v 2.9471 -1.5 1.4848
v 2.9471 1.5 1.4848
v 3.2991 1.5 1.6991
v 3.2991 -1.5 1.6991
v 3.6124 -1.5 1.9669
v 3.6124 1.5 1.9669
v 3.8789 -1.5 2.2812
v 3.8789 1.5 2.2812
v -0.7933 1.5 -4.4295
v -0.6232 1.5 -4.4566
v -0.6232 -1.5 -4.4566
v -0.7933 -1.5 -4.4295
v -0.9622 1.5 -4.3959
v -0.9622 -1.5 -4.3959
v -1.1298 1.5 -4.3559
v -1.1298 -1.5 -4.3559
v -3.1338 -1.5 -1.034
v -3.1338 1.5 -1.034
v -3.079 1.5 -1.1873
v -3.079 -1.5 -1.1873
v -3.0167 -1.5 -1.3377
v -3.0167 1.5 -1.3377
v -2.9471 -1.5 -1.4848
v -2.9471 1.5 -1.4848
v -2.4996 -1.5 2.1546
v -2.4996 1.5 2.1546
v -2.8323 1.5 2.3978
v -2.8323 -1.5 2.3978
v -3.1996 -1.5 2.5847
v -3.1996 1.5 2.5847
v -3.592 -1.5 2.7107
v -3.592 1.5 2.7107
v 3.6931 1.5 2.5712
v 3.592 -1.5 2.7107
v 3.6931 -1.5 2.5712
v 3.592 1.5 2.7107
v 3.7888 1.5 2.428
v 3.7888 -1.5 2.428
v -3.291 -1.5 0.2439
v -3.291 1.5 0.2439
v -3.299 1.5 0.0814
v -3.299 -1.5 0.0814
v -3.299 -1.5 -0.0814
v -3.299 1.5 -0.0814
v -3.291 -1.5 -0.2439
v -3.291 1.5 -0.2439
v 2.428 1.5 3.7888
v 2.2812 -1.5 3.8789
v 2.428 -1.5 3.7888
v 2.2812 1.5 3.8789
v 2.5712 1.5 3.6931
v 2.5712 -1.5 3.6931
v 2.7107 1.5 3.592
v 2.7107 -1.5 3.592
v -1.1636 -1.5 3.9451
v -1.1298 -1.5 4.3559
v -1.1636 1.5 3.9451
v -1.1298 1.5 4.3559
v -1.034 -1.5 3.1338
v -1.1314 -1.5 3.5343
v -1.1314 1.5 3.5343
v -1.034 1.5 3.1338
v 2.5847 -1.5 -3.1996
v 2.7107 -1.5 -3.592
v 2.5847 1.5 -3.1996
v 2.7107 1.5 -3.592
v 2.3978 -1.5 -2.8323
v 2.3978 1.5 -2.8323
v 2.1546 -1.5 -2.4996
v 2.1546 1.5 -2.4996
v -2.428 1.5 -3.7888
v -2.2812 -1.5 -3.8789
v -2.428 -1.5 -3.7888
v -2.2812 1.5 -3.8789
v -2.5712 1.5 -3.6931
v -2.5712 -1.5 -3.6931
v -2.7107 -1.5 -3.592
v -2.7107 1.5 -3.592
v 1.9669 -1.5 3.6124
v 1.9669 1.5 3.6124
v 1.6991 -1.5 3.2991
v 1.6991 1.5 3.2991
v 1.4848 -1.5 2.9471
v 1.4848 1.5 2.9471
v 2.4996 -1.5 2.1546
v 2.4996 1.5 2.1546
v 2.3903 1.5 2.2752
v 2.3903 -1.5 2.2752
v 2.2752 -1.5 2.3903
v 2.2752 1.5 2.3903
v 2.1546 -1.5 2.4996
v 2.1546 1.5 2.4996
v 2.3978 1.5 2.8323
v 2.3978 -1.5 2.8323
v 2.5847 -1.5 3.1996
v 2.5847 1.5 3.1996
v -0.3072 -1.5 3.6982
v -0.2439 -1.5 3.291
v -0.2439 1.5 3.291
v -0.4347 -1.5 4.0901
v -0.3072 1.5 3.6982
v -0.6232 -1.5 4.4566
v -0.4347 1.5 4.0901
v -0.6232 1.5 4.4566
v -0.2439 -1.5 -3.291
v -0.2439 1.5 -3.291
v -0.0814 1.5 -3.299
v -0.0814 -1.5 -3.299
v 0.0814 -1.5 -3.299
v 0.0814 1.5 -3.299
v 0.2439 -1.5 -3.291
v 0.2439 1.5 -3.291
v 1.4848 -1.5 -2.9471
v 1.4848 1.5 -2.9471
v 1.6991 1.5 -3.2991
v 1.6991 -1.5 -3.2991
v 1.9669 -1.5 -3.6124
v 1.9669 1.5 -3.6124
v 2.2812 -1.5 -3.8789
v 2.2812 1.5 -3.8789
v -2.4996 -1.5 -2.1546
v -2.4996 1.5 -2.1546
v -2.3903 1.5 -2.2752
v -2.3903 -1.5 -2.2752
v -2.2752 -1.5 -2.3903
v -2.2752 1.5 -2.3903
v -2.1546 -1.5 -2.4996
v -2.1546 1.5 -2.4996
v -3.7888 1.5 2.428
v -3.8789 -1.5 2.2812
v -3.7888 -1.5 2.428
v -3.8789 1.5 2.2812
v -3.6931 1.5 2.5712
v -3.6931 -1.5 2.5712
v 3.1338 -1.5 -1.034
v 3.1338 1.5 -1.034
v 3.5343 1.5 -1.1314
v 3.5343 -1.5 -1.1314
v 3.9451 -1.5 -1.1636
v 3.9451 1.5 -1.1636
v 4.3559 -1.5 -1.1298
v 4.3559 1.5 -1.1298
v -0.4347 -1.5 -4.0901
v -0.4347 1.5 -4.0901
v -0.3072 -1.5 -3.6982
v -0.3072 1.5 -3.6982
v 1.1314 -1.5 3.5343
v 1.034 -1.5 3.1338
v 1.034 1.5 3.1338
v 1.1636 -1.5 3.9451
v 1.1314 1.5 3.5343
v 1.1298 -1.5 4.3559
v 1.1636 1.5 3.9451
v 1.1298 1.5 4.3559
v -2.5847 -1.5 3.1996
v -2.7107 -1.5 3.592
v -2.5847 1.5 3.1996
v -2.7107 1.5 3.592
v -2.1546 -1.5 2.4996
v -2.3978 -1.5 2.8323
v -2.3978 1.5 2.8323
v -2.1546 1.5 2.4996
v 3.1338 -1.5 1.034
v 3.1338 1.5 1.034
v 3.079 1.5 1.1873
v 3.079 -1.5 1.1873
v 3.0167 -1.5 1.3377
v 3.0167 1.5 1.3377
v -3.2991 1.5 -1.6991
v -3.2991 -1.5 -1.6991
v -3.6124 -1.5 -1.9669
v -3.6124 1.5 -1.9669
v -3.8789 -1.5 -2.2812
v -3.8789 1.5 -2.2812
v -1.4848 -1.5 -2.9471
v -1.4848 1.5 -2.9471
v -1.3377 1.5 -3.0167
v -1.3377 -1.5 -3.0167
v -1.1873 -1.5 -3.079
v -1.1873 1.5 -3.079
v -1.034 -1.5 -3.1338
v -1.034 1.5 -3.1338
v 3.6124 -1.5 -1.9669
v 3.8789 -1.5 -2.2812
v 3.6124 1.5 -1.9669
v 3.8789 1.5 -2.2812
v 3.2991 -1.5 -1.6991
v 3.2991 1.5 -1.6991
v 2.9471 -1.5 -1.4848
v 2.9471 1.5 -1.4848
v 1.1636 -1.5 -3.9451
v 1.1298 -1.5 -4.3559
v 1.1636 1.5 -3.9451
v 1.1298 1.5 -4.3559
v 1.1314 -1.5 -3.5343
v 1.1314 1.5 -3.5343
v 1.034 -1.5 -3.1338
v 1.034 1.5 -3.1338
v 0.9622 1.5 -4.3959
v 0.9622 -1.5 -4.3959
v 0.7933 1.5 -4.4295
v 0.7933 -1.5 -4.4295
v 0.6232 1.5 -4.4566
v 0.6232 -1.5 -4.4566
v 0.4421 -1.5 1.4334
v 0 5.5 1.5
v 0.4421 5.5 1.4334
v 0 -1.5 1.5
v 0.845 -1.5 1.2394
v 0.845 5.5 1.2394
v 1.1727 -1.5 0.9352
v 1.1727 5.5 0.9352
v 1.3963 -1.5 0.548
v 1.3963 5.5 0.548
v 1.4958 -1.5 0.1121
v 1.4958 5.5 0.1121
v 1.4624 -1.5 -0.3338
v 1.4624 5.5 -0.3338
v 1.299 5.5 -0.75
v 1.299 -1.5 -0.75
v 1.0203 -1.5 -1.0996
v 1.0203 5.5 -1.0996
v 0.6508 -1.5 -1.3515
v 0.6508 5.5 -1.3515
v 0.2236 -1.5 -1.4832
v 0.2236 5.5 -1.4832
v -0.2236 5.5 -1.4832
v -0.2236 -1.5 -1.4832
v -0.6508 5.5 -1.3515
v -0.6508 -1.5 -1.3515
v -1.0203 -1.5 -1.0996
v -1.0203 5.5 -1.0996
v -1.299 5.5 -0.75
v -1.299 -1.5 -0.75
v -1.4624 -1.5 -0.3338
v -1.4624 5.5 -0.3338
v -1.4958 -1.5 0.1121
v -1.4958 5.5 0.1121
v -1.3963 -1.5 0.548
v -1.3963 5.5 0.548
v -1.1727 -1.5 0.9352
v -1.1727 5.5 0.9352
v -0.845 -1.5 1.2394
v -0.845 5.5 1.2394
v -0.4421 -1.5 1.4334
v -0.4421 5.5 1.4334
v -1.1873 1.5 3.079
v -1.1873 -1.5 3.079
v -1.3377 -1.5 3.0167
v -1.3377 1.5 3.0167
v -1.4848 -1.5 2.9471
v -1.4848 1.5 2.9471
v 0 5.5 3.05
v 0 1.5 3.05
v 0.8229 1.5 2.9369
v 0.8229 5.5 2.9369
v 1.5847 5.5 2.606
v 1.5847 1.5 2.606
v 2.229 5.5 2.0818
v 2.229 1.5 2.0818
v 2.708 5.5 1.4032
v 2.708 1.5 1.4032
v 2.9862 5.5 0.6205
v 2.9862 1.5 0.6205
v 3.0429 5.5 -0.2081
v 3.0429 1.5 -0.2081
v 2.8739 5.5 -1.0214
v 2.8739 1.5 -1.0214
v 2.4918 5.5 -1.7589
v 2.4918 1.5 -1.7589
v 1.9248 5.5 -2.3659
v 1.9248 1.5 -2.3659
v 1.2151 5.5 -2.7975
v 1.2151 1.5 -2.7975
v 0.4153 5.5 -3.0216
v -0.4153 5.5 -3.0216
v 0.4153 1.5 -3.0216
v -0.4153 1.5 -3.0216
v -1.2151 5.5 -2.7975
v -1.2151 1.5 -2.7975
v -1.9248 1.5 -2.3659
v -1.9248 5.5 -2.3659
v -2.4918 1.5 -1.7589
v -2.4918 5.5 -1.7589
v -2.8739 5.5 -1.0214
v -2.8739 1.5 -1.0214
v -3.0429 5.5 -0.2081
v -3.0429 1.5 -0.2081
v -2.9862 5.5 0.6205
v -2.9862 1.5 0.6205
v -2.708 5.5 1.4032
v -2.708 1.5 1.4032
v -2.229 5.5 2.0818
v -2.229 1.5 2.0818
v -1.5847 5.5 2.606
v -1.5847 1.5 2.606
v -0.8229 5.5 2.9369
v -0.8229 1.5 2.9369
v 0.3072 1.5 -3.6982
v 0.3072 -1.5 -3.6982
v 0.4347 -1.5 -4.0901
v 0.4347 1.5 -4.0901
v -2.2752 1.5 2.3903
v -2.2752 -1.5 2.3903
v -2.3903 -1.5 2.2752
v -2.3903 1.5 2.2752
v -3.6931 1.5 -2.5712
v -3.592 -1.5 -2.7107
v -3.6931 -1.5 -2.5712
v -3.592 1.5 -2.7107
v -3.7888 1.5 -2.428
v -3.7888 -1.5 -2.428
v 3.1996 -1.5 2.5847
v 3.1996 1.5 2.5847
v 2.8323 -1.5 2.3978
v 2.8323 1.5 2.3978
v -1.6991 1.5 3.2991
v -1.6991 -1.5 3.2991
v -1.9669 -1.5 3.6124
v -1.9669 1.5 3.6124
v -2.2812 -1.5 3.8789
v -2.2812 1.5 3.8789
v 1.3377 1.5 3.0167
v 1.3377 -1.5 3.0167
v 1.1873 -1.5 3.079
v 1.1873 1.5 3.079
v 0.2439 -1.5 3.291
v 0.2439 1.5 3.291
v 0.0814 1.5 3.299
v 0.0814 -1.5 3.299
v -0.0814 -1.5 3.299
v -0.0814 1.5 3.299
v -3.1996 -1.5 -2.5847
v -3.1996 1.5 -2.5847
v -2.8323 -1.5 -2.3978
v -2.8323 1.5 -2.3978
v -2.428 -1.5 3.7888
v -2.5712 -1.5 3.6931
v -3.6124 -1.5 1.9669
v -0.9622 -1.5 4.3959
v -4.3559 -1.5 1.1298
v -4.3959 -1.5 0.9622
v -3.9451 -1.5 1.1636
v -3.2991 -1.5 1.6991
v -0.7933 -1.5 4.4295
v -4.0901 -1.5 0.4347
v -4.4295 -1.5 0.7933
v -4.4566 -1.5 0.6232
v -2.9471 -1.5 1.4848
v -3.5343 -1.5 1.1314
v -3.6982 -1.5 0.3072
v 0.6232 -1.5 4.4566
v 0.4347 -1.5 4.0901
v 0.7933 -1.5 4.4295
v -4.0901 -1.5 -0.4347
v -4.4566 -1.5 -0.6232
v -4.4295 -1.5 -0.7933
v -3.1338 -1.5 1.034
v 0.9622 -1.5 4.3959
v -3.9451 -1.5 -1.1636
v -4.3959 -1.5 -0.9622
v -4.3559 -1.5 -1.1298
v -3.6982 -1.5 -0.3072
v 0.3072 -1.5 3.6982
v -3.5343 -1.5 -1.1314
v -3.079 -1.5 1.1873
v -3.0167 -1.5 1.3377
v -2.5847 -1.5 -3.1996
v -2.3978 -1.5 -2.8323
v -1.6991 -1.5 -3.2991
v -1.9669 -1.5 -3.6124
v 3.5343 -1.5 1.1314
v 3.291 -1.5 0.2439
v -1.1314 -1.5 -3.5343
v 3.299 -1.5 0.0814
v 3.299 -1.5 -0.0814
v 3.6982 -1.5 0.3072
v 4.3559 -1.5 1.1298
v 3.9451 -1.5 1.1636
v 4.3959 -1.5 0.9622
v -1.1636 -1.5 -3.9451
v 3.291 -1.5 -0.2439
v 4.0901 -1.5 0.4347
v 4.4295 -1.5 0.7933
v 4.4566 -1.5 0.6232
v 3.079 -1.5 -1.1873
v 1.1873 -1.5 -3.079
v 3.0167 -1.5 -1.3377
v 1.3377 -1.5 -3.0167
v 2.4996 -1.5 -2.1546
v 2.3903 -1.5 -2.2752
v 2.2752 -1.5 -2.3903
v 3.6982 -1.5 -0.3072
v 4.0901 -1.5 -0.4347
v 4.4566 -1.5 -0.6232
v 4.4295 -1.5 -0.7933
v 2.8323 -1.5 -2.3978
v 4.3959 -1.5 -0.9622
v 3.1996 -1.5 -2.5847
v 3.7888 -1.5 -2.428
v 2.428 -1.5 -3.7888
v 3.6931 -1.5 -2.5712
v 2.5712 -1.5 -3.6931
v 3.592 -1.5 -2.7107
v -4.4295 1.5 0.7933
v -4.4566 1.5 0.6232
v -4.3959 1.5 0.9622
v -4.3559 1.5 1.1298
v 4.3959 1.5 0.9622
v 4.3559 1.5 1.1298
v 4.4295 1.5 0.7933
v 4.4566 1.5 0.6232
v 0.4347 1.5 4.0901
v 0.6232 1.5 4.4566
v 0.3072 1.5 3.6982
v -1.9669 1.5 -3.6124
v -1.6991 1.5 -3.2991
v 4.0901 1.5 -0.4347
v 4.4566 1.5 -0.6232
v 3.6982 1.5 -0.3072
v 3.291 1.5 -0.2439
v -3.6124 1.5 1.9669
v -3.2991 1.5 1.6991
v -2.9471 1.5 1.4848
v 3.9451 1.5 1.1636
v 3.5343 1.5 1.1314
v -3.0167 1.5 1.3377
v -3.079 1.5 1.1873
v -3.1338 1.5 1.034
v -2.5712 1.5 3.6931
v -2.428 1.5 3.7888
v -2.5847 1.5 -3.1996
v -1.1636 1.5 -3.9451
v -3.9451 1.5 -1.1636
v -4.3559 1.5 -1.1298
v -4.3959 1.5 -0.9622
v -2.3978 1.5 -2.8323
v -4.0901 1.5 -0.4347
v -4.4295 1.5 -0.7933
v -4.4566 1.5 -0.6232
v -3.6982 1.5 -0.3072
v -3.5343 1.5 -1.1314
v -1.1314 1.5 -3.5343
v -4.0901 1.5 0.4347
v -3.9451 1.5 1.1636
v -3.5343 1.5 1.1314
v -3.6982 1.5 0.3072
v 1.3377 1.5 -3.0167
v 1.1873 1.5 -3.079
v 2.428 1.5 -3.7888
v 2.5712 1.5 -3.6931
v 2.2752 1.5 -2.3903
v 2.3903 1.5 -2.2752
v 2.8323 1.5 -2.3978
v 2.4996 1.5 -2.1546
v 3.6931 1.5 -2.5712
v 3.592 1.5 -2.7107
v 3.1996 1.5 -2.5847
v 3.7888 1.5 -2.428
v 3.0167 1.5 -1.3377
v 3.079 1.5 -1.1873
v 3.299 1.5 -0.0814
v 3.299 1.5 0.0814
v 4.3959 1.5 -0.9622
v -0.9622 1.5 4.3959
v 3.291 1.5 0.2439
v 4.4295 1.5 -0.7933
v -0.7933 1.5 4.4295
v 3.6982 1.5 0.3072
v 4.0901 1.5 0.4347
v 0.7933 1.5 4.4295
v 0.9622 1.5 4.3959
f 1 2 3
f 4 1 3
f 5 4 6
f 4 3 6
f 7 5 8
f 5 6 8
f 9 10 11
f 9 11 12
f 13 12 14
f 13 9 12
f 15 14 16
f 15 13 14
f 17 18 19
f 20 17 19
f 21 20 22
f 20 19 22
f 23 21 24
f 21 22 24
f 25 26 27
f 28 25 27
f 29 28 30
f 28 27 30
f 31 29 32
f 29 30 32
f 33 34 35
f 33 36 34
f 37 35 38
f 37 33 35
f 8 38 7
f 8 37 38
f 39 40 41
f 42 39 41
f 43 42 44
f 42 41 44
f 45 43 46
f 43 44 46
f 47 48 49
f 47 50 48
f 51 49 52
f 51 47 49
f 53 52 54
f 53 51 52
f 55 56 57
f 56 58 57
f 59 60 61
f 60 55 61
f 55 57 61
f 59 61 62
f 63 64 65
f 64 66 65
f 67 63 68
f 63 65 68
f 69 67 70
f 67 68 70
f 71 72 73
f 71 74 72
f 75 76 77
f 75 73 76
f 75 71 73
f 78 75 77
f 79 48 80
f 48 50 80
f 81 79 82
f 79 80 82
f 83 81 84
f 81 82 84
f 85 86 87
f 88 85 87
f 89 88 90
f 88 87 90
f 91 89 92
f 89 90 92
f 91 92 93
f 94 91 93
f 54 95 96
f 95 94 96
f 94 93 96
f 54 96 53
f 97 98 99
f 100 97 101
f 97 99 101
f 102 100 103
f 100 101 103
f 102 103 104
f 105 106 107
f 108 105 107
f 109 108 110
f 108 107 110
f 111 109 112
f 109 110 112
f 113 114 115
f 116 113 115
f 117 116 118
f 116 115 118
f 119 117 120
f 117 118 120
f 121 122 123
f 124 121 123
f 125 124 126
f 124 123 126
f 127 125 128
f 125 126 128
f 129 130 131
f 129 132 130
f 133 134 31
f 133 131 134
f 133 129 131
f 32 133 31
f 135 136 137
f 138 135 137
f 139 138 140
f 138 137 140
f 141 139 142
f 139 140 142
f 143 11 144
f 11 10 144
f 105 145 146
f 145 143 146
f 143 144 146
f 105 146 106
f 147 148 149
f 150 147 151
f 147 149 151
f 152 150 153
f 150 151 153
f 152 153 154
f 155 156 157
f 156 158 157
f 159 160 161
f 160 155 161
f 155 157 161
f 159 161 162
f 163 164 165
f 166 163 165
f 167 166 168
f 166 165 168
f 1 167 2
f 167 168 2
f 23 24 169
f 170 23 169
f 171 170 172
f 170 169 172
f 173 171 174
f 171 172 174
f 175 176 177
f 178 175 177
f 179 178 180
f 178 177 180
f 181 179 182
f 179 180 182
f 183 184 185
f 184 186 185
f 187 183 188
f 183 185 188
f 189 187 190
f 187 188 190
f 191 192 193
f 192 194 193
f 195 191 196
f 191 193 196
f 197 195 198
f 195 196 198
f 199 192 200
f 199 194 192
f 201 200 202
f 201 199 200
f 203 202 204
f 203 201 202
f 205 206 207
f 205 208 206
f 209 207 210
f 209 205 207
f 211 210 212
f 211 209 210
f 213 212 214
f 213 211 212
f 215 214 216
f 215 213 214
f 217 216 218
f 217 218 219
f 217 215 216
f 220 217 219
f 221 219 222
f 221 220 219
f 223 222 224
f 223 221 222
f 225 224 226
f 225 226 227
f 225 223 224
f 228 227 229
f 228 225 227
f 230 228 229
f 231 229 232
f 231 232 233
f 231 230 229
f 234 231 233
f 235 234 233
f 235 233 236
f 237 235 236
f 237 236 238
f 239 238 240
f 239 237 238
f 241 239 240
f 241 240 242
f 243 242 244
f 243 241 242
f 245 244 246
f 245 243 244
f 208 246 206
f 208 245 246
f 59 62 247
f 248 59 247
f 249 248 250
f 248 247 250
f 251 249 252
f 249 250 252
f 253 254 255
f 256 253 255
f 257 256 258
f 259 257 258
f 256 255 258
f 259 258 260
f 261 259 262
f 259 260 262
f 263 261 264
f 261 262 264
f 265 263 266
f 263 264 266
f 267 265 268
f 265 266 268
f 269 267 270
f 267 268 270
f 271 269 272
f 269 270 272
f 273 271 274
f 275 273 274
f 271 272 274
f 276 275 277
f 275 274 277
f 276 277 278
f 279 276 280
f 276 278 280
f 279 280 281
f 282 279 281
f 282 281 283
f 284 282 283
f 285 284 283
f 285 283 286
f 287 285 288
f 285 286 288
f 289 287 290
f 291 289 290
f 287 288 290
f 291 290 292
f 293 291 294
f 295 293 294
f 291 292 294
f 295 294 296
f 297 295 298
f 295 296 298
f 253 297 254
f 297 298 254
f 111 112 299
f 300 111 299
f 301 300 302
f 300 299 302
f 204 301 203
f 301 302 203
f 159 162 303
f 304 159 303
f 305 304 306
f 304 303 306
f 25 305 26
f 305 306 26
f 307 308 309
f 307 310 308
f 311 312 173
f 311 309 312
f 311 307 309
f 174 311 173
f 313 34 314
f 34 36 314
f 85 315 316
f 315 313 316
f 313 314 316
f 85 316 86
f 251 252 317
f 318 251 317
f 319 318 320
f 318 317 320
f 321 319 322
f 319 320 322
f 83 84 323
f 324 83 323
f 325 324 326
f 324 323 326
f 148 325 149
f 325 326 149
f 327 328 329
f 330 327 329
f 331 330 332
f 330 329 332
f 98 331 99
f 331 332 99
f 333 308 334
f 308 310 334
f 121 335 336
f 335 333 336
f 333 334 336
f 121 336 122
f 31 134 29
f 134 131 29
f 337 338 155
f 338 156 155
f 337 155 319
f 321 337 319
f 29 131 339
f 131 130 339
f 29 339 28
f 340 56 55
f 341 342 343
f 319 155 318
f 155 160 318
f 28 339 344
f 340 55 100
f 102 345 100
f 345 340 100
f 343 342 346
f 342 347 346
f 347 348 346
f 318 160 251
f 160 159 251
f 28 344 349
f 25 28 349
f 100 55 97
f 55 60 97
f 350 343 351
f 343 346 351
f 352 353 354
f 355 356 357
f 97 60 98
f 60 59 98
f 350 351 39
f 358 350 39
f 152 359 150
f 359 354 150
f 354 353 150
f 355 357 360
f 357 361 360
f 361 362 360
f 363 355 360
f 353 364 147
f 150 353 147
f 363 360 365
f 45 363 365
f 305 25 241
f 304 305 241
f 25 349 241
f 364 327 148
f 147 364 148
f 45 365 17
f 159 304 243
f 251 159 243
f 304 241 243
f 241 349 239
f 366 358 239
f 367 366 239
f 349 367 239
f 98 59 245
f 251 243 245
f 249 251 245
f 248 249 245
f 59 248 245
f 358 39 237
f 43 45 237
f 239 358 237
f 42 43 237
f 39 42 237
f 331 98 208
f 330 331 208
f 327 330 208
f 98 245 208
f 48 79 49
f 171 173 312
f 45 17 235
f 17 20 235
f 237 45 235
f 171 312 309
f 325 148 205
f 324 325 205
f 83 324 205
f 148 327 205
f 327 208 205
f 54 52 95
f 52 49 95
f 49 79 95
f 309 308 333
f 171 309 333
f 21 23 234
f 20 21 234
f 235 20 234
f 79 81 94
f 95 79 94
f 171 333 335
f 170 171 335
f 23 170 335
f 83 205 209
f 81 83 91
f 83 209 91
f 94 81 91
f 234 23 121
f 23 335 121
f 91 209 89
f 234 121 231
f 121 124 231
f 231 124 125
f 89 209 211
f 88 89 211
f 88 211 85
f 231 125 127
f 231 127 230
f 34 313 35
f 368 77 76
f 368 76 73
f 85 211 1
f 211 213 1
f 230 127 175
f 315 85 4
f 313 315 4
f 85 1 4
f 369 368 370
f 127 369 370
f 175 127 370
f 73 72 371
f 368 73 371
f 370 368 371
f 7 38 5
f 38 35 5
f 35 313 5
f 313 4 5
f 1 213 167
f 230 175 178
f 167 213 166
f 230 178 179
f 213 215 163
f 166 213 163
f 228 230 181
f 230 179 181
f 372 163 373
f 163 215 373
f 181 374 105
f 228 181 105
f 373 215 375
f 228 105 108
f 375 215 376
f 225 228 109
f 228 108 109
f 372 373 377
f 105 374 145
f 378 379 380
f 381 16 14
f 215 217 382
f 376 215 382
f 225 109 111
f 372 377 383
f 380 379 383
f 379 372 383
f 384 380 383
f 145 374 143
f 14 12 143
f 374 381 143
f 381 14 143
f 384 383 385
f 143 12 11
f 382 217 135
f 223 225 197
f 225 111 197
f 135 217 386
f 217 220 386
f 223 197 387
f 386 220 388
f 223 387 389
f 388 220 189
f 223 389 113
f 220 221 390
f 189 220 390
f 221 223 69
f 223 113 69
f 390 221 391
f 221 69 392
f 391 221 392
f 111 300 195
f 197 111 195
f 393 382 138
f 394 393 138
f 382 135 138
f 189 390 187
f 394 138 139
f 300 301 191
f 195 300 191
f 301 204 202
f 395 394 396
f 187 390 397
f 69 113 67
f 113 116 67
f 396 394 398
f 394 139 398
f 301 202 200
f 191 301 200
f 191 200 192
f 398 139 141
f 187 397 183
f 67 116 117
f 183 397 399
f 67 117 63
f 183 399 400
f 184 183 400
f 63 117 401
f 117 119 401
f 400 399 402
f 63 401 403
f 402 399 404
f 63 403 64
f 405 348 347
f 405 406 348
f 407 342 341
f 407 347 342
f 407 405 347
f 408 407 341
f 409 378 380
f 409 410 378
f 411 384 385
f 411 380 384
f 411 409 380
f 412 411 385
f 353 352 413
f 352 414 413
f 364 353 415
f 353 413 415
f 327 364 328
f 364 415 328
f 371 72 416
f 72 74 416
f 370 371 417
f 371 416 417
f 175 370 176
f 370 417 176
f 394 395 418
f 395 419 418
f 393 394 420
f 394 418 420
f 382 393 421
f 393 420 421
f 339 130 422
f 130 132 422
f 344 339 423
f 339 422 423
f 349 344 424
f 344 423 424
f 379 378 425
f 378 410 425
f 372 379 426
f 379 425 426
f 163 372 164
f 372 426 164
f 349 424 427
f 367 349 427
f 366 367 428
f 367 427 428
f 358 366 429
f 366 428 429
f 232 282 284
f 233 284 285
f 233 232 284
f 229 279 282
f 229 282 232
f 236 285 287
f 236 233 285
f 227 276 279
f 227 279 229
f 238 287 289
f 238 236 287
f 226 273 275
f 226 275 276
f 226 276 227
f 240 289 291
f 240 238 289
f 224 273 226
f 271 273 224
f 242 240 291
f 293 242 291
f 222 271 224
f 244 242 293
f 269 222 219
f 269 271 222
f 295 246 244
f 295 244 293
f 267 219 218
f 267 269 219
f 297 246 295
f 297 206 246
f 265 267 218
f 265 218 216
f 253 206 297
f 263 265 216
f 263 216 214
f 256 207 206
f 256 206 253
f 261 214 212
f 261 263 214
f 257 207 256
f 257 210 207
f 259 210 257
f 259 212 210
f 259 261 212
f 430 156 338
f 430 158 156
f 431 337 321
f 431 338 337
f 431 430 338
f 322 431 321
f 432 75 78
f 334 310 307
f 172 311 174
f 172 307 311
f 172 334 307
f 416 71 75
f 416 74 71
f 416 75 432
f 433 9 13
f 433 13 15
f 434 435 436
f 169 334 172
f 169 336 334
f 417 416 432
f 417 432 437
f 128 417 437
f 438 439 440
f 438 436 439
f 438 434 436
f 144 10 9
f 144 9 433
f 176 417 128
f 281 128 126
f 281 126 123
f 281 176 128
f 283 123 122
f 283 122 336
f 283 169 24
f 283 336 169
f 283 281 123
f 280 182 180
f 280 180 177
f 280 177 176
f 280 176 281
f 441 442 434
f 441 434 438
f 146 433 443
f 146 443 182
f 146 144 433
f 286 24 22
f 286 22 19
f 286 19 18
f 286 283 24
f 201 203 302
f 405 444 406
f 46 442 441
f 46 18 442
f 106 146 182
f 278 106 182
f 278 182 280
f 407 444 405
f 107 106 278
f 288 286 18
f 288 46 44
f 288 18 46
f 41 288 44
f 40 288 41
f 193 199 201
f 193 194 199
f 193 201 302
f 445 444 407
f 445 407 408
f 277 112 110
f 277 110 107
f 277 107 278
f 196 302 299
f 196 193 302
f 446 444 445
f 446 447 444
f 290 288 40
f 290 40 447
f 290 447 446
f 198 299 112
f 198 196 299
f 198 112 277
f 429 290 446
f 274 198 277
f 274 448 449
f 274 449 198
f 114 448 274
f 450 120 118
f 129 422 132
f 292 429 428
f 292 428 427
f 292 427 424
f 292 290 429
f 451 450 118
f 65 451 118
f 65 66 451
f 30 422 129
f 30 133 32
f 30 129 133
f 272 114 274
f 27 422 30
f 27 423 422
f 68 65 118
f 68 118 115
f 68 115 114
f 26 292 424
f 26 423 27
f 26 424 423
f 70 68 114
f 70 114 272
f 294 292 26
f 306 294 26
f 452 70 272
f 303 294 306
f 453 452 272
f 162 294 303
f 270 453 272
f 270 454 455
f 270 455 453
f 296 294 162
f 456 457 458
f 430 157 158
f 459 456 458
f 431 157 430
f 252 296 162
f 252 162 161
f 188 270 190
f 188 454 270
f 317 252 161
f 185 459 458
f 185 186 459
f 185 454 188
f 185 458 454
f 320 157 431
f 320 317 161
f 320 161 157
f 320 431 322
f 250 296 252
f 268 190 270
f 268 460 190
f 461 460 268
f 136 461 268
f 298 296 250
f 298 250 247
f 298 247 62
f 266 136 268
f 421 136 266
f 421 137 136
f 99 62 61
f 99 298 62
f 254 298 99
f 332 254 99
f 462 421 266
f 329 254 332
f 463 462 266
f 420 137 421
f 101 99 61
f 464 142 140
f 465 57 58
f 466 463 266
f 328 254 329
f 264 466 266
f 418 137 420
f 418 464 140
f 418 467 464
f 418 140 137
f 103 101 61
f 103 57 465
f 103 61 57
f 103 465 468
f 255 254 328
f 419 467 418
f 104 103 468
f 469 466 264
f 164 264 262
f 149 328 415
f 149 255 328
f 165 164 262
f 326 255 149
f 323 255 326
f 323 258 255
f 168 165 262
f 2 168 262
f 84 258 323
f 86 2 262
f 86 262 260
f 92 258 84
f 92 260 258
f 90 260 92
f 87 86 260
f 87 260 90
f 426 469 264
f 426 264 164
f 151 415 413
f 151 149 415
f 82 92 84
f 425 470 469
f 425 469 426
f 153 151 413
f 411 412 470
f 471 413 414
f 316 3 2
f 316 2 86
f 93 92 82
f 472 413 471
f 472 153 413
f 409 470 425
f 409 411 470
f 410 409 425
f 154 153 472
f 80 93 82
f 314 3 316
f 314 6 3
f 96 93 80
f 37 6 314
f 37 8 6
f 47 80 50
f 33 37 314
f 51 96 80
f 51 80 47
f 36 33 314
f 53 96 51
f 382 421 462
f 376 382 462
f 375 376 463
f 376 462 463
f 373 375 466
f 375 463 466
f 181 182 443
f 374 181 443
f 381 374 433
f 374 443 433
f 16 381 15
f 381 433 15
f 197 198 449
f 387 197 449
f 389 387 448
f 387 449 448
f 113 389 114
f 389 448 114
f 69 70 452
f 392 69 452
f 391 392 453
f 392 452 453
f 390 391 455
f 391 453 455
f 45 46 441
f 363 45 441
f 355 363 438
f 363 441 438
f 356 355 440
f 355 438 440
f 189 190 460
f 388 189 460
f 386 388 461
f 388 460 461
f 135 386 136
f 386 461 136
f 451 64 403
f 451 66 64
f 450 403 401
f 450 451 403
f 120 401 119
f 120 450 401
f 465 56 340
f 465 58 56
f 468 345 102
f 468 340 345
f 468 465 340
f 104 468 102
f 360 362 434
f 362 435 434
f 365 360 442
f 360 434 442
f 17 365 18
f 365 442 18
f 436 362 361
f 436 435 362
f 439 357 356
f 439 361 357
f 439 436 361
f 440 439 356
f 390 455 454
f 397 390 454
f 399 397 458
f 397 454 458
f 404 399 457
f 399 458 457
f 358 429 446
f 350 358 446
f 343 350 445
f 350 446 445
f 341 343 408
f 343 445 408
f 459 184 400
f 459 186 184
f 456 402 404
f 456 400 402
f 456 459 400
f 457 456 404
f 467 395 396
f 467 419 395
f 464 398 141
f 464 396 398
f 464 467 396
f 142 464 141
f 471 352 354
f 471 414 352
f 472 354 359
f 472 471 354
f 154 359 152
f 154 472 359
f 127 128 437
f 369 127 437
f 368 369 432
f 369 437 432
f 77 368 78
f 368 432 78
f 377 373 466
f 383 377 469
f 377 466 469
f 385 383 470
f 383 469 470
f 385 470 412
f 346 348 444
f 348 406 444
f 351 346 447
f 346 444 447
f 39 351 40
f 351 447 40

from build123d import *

# Parameters (mm, degrees)
SKETCH1_R               = 4.5
SKETCH1_R_2             = 4
SKETCH1_R_3             = 3.3
BOSS_EXTRUDE1_DEPTH     = 1.5
CUT_EXTRUDE1_DEPTH      = 7.538348415
CIRPATTERN1_COUNT       = 16
CUT_EXTRUDE2_DEPTH      = 7.478682276
CUT_EXTRUDE2_DEPTH_BACK = 7.478682276
SKETCH4_R               = 1.5
SKETCH5_R               = 3.05
SKETCH5_R_2             = 1.5
BOSS_EXTRUDE2_DEPTH     = 4


with BuildPart() as part:
    # Sketch1 → Boss-Extrude1 (new, symmetric)
    # profile 1 of 3: a face of its own
    with BuildSketch(Plane(origin=(0, 0, 0), x_dir=(1, 0, 0), z_dir=(0, 1, 0))):
        with Locations(Location((0, 0, 0), (0, 0, 270))):
            Circle(SKETCH1_R)
        Circle(SKETCH1_R_2, mode=Mode.SUBTRACT)
    # profile 2 of 3: a face of its own
    with BuildSketch(Plane(origin=(0, 0, 0), x_dir=(1, 0, 0), z_dir=(0, 1, 0))):
        Circle(SKETCH1_R_2)
        Circle(SKETCH1_R_3, mode=Mode.SUBTRACT)
    # profile 3 of 3: a face of its own
    with BuildSketch(Plane(origin=(0, 0, 0), x_dir=(1, 0, 0), z_dir=(0, 1, 0))):
        Circle(SKETCH1_R_3)
    extrude(amount=BOSS_EXTRUDE1_DEPTH, both=True)

    # Sketch3 → Cut-Extrude1 (cut, symmetric)
    with BuildSketch(Plane(origin=(0, 0, 0), x_dir=(1, 0, 0), z_dir=(0, 1, 0))):
        with BuildLine():
            ThreePointArc((-1.819764324, 5.475523519), (-0.723130395, 4.605944889), (-0.243947252, 3.290970942))
            ThreePointArc((-0.243947252, 3.290970942), (0, 3.3), (0.243947252, 3.290970942))
            ThreePointArc((0.243947252, 3.290970942), (0.723130395, 4.605944889), (1.819764324, 5.475523519))
            ThreePointArc((1.819764324, 5.475523519), (0, 5.77), (-1.819764324, 5.475523519))
        make_face()
    cut_extrude1 = extrude(amount=CUT_EXTRUDE1_DEPTH, both=True, mode=Mode.SUBTRACT)

    # CirPattern1: Cut-Extrude1 ×16 about axis
    cirpattern1_axis = Axis((0, 0, 0), (0, 1, 0))
    for i in range(1, CIRPATTERN1_COUNT):
        add(cut_extrude1.rotate(cirpattern1_axis, i * 360 / CIRPATTERN1_COUNT), mode=Mode.SUBTRACT)

    # Sketch4 → Cut-Extrude2 (cut, two sides: drawn at the far end of the back side and taken through both)
    with BuildSketch(Plane(origin=(0, 0, 0), x_dir=(1, 0, 0), z_dir=(0, 1, 0)).offset(-CUT_EXTRUDE2_DEPTH_BACK)):
        with Locations(Location((0, 0, 0), (0, 0, 270))):
            Circle(SKETCH4_R)
    extrude(amount=CUT_EXTRUDE2_DEPTH + CUT_EXTRUDE2_DEPTH_BACK, mode=Mode.SUBTRACT)

    # Sketch5 → Boss-Extrude2 (add)
    with BuildSketch(Plane(origin=(0, 1.5, 0), x_dir=(1, 0, 0), z_dir=(0, 1, 0))):
        with Locations(Location((0, 0, 0), (0, 0, 270))):
            Circle(SKETCH5_R)
        with Locations(Location((0, 0, 0), (0, 0, 270))):
            Circle(SKETCH5_R_2, mode=Mode.SUBTRACT)
    extrude(amount=BOSS_EXTRUDE2_DEPTH)


solid = part.part
